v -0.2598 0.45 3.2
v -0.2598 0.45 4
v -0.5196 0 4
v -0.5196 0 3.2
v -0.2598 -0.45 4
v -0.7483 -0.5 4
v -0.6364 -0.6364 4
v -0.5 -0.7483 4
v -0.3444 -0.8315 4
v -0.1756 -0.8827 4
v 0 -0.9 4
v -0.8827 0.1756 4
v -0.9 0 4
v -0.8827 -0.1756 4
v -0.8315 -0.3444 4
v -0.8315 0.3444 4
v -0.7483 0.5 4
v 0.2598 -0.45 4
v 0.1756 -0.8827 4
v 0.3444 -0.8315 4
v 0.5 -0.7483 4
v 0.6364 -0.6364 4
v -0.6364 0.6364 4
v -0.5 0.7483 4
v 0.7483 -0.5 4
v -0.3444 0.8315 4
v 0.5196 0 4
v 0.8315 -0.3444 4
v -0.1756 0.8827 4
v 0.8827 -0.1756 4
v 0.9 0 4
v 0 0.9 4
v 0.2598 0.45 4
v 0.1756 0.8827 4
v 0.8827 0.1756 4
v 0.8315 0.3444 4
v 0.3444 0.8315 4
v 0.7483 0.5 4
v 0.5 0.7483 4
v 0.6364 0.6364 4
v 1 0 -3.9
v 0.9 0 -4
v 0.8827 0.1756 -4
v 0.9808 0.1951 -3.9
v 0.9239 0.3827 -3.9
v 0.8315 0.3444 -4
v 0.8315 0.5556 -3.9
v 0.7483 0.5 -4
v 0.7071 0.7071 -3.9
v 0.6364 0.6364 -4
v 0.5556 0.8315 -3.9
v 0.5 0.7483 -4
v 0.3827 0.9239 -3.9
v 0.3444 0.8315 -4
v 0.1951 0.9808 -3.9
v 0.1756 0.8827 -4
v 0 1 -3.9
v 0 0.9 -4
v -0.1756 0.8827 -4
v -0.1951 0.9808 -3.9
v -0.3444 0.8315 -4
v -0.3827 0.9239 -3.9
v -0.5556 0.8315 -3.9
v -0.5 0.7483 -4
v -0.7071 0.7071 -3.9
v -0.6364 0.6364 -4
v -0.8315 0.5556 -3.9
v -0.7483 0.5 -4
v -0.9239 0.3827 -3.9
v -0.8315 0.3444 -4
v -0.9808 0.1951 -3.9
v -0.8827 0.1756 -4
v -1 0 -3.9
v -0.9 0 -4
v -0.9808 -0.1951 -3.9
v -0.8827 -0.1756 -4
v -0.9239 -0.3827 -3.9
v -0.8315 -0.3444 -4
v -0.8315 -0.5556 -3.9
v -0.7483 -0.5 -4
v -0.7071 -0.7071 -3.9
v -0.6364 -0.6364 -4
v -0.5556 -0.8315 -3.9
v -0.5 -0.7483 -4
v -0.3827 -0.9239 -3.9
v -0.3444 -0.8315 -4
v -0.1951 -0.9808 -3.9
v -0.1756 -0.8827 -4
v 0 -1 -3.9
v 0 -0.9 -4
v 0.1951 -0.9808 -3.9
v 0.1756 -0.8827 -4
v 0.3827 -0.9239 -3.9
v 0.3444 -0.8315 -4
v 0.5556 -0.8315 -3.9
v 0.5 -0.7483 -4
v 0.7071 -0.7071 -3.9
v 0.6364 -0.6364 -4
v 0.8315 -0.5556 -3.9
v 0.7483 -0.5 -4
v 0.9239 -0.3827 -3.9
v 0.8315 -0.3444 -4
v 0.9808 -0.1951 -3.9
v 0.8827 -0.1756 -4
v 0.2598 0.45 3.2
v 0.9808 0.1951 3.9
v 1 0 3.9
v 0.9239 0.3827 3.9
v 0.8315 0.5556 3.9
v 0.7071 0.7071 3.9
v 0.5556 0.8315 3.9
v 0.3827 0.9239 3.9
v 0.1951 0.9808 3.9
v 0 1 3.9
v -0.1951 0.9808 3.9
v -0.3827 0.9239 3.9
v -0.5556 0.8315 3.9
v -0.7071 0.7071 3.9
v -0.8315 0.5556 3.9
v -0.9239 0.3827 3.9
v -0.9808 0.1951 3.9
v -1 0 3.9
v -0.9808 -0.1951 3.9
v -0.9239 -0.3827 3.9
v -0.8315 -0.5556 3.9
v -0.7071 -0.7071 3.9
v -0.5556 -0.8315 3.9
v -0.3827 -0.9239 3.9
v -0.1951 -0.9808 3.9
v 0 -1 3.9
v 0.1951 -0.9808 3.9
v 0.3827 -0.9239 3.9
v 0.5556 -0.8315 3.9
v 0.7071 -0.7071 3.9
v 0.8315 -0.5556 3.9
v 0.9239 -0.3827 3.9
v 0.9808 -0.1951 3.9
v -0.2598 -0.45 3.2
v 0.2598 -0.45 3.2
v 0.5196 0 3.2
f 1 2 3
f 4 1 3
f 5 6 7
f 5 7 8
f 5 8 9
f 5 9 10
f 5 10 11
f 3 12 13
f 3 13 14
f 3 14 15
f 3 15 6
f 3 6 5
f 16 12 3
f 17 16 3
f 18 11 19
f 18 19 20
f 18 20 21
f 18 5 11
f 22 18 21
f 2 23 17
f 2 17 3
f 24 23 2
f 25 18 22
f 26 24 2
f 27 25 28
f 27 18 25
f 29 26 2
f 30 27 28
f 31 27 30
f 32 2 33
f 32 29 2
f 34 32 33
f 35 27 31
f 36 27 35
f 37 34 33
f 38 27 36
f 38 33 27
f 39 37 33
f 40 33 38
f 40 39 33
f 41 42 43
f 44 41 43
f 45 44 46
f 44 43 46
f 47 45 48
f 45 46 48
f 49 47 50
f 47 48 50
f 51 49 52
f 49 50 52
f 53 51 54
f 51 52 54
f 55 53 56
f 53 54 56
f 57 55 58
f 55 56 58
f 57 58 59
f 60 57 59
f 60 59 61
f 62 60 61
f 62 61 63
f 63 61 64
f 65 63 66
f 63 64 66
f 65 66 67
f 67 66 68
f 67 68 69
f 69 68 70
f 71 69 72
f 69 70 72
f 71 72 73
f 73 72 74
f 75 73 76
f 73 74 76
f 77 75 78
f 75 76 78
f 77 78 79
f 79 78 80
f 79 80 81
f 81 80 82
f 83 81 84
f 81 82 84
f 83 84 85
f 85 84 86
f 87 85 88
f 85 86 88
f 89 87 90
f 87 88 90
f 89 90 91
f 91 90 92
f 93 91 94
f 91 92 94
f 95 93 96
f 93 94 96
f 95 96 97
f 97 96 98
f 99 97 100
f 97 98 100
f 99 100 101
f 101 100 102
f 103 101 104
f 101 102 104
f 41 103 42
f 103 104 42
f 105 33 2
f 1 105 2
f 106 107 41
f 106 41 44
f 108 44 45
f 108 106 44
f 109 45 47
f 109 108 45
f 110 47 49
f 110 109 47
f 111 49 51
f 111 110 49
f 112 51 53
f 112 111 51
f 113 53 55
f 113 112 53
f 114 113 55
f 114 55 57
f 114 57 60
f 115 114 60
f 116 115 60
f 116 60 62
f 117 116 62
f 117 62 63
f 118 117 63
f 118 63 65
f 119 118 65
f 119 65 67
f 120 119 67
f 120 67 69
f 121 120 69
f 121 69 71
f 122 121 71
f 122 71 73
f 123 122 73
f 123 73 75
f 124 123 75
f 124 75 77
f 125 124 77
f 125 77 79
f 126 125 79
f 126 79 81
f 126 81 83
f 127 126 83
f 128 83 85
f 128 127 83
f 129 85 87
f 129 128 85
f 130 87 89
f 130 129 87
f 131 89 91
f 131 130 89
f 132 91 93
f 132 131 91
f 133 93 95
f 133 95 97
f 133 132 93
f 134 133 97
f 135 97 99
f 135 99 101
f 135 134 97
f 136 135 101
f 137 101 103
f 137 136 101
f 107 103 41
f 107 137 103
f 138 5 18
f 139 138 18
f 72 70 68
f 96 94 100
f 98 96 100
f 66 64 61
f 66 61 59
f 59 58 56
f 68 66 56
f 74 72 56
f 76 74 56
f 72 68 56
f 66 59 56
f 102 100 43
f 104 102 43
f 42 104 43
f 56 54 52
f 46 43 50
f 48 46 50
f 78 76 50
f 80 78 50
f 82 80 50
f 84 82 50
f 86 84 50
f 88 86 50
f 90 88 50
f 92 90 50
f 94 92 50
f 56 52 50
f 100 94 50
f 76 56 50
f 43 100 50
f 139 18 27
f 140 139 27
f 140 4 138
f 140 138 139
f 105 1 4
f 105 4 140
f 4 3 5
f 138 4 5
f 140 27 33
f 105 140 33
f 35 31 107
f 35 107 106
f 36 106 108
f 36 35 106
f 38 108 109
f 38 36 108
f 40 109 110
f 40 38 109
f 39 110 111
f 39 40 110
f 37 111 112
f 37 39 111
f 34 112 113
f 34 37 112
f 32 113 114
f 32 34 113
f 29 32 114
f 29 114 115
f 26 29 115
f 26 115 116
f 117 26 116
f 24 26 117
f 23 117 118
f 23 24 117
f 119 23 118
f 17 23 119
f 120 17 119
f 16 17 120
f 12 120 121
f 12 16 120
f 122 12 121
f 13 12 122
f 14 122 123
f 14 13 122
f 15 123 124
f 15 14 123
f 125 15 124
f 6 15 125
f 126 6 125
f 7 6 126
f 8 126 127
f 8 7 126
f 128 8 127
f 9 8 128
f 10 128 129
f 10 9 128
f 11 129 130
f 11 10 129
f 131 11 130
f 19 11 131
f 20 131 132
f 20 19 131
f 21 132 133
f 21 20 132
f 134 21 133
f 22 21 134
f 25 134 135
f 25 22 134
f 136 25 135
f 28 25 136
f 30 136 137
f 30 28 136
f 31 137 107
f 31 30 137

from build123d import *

# Parameters (mm, degrees)
SKETCH_1_R          = 1
EXTRUDE_1_DEPTH     = 4
CUT_EXTRUDE_1_DEPTH = 0.8
CHAMFER_1_SIZE      = 0.1


with BuildPart() as part:
    # 草图1 → 凸台-拉伸1 (new, symmetric)
    with BuildSketch(Plane.XY):
        Circle(SKETCH_1_R)
    extrude(amount=EXTRUDE_1_DEPTH, both=True)

    # 草图2 → 切除-拉伸1 (cut)
    with BuildSketch(Plane.XY.offset(4)):
        Polygon((0.259807621, 0.45), (-0.259807621, 0.45), (-0.519615242, 0), (-0.259807621, -0.45), (0.259807621, -0.45), (0.519615242, 0), align=None)
    extrude(amount=-CUT_EXTRUDE_1_DEPTH, mode=Mode.SUBTRACT)

    # 倒角1
    chamfer_1_edges = [part.edges().sort_by_distance(p)[0] for p in [
        (-1, 0, -4),
        (-1, 0, 4),
    ]]
    chamfer(chamfer_1_edges, length=CHAMFER_1_SIZE)


solid = part.part
